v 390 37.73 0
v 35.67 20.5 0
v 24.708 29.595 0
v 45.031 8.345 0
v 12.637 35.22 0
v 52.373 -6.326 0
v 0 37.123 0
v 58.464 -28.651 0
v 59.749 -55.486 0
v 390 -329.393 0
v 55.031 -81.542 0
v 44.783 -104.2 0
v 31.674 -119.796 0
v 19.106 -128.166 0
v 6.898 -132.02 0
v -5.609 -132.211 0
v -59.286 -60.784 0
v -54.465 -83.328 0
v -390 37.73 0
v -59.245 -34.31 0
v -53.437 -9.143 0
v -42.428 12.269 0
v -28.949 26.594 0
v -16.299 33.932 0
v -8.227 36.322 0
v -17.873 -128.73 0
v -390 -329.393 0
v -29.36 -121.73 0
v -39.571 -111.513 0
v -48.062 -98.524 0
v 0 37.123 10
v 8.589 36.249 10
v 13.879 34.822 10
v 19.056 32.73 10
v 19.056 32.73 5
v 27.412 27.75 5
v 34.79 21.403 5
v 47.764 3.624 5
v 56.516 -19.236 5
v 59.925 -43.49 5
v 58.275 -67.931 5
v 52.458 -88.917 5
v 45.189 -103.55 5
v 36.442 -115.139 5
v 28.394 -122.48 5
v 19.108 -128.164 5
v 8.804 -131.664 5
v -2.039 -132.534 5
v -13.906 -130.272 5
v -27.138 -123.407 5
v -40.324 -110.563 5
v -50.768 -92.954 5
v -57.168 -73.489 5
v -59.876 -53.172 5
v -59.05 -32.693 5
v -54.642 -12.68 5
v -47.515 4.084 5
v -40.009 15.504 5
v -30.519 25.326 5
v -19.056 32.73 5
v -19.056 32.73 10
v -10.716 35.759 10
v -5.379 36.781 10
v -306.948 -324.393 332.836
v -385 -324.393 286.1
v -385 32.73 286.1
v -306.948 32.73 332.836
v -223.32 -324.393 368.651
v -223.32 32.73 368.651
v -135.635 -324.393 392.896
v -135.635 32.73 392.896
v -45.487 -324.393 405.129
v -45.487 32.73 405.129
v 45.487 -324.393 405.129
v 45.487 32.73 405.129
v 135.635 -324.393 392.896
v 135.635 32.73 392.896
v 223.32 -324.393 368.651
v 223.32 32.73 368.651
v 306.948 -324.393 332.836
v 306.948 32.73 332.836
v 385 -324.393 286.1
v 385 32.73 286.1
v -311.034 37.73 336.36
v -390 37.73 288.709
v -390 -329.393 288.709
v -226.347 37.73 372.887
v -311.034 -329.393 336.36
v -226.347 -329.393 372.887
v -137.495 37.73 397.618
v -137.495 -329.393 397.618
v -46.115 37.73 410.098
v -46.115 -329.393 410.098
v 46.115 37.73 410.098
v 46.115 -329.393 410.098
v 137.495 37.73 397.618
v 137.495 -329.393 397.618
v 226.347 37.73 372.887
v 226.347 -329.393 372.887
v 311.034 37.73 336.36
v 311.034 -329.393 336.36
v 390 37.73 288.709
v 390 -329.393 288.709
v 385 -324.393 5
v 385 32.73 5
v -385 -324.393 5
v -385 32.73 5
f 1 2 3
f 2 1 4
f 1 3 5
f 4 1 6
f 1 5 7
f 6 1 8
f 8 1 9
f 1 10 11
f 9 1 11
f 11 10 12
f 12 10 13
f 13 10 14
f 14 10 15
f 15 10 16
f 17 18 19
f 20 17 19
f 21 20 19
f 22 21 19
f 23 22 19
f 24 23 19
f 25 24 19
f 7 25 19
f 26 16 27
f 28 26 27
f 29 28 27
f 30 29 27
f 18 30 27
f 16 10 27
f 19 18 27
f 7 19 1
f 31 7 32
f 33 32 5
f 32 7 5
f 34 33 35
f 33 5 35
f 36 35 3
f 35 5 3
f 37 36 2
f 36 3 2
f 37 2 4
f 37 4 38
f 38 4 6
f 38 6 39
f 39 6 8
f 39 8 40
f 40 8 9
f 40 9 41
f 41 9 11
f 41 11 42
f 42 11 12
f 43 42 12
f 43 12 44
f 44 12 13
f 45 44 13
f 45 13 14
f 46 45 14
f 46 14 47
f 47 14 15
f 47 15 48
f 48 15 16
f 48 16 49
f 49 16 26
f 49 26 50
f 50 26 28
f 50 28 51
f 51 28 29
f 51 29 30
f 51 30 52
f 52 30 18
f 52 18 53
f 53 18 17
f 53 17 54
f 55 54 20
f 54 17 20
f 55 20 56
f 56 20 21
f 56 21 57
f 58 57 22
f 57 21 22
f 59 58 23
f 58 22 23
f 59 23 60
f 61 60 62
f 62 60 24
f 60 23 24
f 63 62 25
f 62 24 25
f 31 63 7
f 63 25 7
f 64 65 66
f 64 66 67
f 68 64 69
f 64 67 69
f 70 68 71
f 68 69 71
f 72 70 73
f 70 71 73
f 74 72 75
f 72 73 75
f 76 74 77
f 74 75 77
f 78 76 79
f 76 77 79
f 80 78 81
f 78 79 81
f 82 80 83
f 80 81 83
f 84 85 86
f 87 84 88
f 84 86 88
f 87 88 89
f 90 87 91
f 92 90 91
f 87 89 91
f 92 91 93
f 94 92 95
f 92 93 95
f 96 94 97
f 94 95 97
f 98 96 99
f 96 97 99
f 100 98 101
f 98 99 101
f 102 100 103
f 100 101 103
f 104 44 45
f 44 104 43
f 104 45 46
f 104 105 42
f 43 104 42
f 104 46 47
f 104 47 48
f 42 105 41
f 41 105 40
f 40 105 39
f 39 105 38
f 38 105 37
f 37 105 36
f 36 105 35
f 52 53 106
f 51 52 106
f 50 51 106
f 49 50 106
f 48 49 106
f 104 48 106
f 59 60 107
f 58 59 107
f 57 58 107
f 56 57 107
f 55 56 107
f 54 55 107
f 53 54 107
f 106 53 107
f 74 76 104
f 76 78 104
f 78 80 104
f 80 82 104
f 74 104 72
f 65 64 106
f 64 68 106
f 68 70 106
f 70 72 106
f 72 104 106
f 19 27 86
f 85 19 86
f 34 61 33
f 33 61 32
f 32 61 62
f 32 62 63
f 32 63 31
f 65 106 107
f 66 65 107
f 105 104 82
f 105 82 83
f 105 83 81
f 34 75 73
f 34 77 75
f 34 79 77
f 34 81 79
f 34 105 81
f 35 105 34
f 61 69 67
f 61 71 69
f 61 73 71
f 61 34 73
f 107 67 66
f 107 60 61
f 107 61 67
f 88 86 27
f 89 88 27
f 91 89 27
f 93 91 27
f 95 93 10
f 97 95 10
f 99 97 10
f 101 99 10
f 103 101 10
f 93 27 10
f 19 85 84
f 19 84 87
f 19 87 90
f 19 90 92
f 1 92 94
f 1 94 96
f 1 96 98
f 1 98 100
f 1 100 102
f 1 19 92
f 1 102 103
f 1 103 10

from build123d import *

# Parameters (mm, degrees)
EXTRUDE_START            = -329.393398282
EXTRUDE_1_DEPTH          = 367.123106012
CUT_EXTRUDE_2_REACH      = 654.668
CUT_EXTRUDE_2_END_RADIUS = 675
SKETCH_4_W               = 770
SKETCH_4_H               = 357.123106012
SKETCH_5_RX              = 84.852813742
SKETCH_5_RY              = 60
CUT_EXTRUDE_3_DEPTH      = 10


# Read off the part's stored shape, not the designer's step: 凸台-拉伸1
with BuildPart() as part:
    # 凸台-拉伸1 outline → 凸台-拉伸1 (new body)
    with BuildSketch(Plane(origin=(0, 0, 0), x_dir=(1, 0, 0), z_dir=(0, 1, 0)).offset(EXTRUDE_START)):
        with BuildLine():
            Line((390, -288.70946964), (390, 0))
            Line((390, 0), (-390, 0))
            Line((-390, 0), (-390, -288.70946964))
            ThreePointArc((-390, -288.70946964), (0, -411.663690552), (390, -288.70946964))
        make_face()
    extrude(amount=EXTRUDE_1_DEPTH)

    # 切除-拉伸2: up to this cylinder (the profile starts inside it)
    cut_extrude_2_end = Plane(origin=(0, -145.831845, -268.336309448), z_dir=(0, 1, 0)) * Cylinder(CUT_EXTRUDE_2_END_RADIUS, 2660.336, mode=Mode.PRIVATE)
    # 草图4 → 切除-拉伸2 (cut, up to the surface)
    with BuildSketch(Plane(origin=(0, 0, 5), x_dir=(-1, 0, 0), z_dir=(0, 0, -1)), mode=Mode.PRIVATE) as cut_extrude_2_sk1:
        with Locations((0, -145.831845276)):
            Rectangle(SKETCH_4_W, SKETCH_4_H)
    cut_extrude_2_tool1 = extrude(cut_extrude_2_sk1.sketch, amount=-CUT_EXTRUDE_2_REACH, mode=Mode.PRIVATE) & cut_extrude_2_end
    add(cut_extrude_2_tool1.solids().sort_by_distance((0, -145.831845, 5))[0], mode=Mode.SUBTRACT)

    # 草图5 → 切除-拉伸3 (cut)
    with BuildSketch(Plane(origin=(0, 0, 0), x_dir=(-1, 0, 0), z_dir=(0, 0, -1))):
        with Locations(Location((0, -47.72970773), (0, 0, 90))):
            Ellipse(SKETCH_5_RX, SKETCH_5_RY)
    extrude(amount=-CUT_EXTRUDE_3_DEPTH, mode=Mode.SUBTRACT)


solid = part.part
